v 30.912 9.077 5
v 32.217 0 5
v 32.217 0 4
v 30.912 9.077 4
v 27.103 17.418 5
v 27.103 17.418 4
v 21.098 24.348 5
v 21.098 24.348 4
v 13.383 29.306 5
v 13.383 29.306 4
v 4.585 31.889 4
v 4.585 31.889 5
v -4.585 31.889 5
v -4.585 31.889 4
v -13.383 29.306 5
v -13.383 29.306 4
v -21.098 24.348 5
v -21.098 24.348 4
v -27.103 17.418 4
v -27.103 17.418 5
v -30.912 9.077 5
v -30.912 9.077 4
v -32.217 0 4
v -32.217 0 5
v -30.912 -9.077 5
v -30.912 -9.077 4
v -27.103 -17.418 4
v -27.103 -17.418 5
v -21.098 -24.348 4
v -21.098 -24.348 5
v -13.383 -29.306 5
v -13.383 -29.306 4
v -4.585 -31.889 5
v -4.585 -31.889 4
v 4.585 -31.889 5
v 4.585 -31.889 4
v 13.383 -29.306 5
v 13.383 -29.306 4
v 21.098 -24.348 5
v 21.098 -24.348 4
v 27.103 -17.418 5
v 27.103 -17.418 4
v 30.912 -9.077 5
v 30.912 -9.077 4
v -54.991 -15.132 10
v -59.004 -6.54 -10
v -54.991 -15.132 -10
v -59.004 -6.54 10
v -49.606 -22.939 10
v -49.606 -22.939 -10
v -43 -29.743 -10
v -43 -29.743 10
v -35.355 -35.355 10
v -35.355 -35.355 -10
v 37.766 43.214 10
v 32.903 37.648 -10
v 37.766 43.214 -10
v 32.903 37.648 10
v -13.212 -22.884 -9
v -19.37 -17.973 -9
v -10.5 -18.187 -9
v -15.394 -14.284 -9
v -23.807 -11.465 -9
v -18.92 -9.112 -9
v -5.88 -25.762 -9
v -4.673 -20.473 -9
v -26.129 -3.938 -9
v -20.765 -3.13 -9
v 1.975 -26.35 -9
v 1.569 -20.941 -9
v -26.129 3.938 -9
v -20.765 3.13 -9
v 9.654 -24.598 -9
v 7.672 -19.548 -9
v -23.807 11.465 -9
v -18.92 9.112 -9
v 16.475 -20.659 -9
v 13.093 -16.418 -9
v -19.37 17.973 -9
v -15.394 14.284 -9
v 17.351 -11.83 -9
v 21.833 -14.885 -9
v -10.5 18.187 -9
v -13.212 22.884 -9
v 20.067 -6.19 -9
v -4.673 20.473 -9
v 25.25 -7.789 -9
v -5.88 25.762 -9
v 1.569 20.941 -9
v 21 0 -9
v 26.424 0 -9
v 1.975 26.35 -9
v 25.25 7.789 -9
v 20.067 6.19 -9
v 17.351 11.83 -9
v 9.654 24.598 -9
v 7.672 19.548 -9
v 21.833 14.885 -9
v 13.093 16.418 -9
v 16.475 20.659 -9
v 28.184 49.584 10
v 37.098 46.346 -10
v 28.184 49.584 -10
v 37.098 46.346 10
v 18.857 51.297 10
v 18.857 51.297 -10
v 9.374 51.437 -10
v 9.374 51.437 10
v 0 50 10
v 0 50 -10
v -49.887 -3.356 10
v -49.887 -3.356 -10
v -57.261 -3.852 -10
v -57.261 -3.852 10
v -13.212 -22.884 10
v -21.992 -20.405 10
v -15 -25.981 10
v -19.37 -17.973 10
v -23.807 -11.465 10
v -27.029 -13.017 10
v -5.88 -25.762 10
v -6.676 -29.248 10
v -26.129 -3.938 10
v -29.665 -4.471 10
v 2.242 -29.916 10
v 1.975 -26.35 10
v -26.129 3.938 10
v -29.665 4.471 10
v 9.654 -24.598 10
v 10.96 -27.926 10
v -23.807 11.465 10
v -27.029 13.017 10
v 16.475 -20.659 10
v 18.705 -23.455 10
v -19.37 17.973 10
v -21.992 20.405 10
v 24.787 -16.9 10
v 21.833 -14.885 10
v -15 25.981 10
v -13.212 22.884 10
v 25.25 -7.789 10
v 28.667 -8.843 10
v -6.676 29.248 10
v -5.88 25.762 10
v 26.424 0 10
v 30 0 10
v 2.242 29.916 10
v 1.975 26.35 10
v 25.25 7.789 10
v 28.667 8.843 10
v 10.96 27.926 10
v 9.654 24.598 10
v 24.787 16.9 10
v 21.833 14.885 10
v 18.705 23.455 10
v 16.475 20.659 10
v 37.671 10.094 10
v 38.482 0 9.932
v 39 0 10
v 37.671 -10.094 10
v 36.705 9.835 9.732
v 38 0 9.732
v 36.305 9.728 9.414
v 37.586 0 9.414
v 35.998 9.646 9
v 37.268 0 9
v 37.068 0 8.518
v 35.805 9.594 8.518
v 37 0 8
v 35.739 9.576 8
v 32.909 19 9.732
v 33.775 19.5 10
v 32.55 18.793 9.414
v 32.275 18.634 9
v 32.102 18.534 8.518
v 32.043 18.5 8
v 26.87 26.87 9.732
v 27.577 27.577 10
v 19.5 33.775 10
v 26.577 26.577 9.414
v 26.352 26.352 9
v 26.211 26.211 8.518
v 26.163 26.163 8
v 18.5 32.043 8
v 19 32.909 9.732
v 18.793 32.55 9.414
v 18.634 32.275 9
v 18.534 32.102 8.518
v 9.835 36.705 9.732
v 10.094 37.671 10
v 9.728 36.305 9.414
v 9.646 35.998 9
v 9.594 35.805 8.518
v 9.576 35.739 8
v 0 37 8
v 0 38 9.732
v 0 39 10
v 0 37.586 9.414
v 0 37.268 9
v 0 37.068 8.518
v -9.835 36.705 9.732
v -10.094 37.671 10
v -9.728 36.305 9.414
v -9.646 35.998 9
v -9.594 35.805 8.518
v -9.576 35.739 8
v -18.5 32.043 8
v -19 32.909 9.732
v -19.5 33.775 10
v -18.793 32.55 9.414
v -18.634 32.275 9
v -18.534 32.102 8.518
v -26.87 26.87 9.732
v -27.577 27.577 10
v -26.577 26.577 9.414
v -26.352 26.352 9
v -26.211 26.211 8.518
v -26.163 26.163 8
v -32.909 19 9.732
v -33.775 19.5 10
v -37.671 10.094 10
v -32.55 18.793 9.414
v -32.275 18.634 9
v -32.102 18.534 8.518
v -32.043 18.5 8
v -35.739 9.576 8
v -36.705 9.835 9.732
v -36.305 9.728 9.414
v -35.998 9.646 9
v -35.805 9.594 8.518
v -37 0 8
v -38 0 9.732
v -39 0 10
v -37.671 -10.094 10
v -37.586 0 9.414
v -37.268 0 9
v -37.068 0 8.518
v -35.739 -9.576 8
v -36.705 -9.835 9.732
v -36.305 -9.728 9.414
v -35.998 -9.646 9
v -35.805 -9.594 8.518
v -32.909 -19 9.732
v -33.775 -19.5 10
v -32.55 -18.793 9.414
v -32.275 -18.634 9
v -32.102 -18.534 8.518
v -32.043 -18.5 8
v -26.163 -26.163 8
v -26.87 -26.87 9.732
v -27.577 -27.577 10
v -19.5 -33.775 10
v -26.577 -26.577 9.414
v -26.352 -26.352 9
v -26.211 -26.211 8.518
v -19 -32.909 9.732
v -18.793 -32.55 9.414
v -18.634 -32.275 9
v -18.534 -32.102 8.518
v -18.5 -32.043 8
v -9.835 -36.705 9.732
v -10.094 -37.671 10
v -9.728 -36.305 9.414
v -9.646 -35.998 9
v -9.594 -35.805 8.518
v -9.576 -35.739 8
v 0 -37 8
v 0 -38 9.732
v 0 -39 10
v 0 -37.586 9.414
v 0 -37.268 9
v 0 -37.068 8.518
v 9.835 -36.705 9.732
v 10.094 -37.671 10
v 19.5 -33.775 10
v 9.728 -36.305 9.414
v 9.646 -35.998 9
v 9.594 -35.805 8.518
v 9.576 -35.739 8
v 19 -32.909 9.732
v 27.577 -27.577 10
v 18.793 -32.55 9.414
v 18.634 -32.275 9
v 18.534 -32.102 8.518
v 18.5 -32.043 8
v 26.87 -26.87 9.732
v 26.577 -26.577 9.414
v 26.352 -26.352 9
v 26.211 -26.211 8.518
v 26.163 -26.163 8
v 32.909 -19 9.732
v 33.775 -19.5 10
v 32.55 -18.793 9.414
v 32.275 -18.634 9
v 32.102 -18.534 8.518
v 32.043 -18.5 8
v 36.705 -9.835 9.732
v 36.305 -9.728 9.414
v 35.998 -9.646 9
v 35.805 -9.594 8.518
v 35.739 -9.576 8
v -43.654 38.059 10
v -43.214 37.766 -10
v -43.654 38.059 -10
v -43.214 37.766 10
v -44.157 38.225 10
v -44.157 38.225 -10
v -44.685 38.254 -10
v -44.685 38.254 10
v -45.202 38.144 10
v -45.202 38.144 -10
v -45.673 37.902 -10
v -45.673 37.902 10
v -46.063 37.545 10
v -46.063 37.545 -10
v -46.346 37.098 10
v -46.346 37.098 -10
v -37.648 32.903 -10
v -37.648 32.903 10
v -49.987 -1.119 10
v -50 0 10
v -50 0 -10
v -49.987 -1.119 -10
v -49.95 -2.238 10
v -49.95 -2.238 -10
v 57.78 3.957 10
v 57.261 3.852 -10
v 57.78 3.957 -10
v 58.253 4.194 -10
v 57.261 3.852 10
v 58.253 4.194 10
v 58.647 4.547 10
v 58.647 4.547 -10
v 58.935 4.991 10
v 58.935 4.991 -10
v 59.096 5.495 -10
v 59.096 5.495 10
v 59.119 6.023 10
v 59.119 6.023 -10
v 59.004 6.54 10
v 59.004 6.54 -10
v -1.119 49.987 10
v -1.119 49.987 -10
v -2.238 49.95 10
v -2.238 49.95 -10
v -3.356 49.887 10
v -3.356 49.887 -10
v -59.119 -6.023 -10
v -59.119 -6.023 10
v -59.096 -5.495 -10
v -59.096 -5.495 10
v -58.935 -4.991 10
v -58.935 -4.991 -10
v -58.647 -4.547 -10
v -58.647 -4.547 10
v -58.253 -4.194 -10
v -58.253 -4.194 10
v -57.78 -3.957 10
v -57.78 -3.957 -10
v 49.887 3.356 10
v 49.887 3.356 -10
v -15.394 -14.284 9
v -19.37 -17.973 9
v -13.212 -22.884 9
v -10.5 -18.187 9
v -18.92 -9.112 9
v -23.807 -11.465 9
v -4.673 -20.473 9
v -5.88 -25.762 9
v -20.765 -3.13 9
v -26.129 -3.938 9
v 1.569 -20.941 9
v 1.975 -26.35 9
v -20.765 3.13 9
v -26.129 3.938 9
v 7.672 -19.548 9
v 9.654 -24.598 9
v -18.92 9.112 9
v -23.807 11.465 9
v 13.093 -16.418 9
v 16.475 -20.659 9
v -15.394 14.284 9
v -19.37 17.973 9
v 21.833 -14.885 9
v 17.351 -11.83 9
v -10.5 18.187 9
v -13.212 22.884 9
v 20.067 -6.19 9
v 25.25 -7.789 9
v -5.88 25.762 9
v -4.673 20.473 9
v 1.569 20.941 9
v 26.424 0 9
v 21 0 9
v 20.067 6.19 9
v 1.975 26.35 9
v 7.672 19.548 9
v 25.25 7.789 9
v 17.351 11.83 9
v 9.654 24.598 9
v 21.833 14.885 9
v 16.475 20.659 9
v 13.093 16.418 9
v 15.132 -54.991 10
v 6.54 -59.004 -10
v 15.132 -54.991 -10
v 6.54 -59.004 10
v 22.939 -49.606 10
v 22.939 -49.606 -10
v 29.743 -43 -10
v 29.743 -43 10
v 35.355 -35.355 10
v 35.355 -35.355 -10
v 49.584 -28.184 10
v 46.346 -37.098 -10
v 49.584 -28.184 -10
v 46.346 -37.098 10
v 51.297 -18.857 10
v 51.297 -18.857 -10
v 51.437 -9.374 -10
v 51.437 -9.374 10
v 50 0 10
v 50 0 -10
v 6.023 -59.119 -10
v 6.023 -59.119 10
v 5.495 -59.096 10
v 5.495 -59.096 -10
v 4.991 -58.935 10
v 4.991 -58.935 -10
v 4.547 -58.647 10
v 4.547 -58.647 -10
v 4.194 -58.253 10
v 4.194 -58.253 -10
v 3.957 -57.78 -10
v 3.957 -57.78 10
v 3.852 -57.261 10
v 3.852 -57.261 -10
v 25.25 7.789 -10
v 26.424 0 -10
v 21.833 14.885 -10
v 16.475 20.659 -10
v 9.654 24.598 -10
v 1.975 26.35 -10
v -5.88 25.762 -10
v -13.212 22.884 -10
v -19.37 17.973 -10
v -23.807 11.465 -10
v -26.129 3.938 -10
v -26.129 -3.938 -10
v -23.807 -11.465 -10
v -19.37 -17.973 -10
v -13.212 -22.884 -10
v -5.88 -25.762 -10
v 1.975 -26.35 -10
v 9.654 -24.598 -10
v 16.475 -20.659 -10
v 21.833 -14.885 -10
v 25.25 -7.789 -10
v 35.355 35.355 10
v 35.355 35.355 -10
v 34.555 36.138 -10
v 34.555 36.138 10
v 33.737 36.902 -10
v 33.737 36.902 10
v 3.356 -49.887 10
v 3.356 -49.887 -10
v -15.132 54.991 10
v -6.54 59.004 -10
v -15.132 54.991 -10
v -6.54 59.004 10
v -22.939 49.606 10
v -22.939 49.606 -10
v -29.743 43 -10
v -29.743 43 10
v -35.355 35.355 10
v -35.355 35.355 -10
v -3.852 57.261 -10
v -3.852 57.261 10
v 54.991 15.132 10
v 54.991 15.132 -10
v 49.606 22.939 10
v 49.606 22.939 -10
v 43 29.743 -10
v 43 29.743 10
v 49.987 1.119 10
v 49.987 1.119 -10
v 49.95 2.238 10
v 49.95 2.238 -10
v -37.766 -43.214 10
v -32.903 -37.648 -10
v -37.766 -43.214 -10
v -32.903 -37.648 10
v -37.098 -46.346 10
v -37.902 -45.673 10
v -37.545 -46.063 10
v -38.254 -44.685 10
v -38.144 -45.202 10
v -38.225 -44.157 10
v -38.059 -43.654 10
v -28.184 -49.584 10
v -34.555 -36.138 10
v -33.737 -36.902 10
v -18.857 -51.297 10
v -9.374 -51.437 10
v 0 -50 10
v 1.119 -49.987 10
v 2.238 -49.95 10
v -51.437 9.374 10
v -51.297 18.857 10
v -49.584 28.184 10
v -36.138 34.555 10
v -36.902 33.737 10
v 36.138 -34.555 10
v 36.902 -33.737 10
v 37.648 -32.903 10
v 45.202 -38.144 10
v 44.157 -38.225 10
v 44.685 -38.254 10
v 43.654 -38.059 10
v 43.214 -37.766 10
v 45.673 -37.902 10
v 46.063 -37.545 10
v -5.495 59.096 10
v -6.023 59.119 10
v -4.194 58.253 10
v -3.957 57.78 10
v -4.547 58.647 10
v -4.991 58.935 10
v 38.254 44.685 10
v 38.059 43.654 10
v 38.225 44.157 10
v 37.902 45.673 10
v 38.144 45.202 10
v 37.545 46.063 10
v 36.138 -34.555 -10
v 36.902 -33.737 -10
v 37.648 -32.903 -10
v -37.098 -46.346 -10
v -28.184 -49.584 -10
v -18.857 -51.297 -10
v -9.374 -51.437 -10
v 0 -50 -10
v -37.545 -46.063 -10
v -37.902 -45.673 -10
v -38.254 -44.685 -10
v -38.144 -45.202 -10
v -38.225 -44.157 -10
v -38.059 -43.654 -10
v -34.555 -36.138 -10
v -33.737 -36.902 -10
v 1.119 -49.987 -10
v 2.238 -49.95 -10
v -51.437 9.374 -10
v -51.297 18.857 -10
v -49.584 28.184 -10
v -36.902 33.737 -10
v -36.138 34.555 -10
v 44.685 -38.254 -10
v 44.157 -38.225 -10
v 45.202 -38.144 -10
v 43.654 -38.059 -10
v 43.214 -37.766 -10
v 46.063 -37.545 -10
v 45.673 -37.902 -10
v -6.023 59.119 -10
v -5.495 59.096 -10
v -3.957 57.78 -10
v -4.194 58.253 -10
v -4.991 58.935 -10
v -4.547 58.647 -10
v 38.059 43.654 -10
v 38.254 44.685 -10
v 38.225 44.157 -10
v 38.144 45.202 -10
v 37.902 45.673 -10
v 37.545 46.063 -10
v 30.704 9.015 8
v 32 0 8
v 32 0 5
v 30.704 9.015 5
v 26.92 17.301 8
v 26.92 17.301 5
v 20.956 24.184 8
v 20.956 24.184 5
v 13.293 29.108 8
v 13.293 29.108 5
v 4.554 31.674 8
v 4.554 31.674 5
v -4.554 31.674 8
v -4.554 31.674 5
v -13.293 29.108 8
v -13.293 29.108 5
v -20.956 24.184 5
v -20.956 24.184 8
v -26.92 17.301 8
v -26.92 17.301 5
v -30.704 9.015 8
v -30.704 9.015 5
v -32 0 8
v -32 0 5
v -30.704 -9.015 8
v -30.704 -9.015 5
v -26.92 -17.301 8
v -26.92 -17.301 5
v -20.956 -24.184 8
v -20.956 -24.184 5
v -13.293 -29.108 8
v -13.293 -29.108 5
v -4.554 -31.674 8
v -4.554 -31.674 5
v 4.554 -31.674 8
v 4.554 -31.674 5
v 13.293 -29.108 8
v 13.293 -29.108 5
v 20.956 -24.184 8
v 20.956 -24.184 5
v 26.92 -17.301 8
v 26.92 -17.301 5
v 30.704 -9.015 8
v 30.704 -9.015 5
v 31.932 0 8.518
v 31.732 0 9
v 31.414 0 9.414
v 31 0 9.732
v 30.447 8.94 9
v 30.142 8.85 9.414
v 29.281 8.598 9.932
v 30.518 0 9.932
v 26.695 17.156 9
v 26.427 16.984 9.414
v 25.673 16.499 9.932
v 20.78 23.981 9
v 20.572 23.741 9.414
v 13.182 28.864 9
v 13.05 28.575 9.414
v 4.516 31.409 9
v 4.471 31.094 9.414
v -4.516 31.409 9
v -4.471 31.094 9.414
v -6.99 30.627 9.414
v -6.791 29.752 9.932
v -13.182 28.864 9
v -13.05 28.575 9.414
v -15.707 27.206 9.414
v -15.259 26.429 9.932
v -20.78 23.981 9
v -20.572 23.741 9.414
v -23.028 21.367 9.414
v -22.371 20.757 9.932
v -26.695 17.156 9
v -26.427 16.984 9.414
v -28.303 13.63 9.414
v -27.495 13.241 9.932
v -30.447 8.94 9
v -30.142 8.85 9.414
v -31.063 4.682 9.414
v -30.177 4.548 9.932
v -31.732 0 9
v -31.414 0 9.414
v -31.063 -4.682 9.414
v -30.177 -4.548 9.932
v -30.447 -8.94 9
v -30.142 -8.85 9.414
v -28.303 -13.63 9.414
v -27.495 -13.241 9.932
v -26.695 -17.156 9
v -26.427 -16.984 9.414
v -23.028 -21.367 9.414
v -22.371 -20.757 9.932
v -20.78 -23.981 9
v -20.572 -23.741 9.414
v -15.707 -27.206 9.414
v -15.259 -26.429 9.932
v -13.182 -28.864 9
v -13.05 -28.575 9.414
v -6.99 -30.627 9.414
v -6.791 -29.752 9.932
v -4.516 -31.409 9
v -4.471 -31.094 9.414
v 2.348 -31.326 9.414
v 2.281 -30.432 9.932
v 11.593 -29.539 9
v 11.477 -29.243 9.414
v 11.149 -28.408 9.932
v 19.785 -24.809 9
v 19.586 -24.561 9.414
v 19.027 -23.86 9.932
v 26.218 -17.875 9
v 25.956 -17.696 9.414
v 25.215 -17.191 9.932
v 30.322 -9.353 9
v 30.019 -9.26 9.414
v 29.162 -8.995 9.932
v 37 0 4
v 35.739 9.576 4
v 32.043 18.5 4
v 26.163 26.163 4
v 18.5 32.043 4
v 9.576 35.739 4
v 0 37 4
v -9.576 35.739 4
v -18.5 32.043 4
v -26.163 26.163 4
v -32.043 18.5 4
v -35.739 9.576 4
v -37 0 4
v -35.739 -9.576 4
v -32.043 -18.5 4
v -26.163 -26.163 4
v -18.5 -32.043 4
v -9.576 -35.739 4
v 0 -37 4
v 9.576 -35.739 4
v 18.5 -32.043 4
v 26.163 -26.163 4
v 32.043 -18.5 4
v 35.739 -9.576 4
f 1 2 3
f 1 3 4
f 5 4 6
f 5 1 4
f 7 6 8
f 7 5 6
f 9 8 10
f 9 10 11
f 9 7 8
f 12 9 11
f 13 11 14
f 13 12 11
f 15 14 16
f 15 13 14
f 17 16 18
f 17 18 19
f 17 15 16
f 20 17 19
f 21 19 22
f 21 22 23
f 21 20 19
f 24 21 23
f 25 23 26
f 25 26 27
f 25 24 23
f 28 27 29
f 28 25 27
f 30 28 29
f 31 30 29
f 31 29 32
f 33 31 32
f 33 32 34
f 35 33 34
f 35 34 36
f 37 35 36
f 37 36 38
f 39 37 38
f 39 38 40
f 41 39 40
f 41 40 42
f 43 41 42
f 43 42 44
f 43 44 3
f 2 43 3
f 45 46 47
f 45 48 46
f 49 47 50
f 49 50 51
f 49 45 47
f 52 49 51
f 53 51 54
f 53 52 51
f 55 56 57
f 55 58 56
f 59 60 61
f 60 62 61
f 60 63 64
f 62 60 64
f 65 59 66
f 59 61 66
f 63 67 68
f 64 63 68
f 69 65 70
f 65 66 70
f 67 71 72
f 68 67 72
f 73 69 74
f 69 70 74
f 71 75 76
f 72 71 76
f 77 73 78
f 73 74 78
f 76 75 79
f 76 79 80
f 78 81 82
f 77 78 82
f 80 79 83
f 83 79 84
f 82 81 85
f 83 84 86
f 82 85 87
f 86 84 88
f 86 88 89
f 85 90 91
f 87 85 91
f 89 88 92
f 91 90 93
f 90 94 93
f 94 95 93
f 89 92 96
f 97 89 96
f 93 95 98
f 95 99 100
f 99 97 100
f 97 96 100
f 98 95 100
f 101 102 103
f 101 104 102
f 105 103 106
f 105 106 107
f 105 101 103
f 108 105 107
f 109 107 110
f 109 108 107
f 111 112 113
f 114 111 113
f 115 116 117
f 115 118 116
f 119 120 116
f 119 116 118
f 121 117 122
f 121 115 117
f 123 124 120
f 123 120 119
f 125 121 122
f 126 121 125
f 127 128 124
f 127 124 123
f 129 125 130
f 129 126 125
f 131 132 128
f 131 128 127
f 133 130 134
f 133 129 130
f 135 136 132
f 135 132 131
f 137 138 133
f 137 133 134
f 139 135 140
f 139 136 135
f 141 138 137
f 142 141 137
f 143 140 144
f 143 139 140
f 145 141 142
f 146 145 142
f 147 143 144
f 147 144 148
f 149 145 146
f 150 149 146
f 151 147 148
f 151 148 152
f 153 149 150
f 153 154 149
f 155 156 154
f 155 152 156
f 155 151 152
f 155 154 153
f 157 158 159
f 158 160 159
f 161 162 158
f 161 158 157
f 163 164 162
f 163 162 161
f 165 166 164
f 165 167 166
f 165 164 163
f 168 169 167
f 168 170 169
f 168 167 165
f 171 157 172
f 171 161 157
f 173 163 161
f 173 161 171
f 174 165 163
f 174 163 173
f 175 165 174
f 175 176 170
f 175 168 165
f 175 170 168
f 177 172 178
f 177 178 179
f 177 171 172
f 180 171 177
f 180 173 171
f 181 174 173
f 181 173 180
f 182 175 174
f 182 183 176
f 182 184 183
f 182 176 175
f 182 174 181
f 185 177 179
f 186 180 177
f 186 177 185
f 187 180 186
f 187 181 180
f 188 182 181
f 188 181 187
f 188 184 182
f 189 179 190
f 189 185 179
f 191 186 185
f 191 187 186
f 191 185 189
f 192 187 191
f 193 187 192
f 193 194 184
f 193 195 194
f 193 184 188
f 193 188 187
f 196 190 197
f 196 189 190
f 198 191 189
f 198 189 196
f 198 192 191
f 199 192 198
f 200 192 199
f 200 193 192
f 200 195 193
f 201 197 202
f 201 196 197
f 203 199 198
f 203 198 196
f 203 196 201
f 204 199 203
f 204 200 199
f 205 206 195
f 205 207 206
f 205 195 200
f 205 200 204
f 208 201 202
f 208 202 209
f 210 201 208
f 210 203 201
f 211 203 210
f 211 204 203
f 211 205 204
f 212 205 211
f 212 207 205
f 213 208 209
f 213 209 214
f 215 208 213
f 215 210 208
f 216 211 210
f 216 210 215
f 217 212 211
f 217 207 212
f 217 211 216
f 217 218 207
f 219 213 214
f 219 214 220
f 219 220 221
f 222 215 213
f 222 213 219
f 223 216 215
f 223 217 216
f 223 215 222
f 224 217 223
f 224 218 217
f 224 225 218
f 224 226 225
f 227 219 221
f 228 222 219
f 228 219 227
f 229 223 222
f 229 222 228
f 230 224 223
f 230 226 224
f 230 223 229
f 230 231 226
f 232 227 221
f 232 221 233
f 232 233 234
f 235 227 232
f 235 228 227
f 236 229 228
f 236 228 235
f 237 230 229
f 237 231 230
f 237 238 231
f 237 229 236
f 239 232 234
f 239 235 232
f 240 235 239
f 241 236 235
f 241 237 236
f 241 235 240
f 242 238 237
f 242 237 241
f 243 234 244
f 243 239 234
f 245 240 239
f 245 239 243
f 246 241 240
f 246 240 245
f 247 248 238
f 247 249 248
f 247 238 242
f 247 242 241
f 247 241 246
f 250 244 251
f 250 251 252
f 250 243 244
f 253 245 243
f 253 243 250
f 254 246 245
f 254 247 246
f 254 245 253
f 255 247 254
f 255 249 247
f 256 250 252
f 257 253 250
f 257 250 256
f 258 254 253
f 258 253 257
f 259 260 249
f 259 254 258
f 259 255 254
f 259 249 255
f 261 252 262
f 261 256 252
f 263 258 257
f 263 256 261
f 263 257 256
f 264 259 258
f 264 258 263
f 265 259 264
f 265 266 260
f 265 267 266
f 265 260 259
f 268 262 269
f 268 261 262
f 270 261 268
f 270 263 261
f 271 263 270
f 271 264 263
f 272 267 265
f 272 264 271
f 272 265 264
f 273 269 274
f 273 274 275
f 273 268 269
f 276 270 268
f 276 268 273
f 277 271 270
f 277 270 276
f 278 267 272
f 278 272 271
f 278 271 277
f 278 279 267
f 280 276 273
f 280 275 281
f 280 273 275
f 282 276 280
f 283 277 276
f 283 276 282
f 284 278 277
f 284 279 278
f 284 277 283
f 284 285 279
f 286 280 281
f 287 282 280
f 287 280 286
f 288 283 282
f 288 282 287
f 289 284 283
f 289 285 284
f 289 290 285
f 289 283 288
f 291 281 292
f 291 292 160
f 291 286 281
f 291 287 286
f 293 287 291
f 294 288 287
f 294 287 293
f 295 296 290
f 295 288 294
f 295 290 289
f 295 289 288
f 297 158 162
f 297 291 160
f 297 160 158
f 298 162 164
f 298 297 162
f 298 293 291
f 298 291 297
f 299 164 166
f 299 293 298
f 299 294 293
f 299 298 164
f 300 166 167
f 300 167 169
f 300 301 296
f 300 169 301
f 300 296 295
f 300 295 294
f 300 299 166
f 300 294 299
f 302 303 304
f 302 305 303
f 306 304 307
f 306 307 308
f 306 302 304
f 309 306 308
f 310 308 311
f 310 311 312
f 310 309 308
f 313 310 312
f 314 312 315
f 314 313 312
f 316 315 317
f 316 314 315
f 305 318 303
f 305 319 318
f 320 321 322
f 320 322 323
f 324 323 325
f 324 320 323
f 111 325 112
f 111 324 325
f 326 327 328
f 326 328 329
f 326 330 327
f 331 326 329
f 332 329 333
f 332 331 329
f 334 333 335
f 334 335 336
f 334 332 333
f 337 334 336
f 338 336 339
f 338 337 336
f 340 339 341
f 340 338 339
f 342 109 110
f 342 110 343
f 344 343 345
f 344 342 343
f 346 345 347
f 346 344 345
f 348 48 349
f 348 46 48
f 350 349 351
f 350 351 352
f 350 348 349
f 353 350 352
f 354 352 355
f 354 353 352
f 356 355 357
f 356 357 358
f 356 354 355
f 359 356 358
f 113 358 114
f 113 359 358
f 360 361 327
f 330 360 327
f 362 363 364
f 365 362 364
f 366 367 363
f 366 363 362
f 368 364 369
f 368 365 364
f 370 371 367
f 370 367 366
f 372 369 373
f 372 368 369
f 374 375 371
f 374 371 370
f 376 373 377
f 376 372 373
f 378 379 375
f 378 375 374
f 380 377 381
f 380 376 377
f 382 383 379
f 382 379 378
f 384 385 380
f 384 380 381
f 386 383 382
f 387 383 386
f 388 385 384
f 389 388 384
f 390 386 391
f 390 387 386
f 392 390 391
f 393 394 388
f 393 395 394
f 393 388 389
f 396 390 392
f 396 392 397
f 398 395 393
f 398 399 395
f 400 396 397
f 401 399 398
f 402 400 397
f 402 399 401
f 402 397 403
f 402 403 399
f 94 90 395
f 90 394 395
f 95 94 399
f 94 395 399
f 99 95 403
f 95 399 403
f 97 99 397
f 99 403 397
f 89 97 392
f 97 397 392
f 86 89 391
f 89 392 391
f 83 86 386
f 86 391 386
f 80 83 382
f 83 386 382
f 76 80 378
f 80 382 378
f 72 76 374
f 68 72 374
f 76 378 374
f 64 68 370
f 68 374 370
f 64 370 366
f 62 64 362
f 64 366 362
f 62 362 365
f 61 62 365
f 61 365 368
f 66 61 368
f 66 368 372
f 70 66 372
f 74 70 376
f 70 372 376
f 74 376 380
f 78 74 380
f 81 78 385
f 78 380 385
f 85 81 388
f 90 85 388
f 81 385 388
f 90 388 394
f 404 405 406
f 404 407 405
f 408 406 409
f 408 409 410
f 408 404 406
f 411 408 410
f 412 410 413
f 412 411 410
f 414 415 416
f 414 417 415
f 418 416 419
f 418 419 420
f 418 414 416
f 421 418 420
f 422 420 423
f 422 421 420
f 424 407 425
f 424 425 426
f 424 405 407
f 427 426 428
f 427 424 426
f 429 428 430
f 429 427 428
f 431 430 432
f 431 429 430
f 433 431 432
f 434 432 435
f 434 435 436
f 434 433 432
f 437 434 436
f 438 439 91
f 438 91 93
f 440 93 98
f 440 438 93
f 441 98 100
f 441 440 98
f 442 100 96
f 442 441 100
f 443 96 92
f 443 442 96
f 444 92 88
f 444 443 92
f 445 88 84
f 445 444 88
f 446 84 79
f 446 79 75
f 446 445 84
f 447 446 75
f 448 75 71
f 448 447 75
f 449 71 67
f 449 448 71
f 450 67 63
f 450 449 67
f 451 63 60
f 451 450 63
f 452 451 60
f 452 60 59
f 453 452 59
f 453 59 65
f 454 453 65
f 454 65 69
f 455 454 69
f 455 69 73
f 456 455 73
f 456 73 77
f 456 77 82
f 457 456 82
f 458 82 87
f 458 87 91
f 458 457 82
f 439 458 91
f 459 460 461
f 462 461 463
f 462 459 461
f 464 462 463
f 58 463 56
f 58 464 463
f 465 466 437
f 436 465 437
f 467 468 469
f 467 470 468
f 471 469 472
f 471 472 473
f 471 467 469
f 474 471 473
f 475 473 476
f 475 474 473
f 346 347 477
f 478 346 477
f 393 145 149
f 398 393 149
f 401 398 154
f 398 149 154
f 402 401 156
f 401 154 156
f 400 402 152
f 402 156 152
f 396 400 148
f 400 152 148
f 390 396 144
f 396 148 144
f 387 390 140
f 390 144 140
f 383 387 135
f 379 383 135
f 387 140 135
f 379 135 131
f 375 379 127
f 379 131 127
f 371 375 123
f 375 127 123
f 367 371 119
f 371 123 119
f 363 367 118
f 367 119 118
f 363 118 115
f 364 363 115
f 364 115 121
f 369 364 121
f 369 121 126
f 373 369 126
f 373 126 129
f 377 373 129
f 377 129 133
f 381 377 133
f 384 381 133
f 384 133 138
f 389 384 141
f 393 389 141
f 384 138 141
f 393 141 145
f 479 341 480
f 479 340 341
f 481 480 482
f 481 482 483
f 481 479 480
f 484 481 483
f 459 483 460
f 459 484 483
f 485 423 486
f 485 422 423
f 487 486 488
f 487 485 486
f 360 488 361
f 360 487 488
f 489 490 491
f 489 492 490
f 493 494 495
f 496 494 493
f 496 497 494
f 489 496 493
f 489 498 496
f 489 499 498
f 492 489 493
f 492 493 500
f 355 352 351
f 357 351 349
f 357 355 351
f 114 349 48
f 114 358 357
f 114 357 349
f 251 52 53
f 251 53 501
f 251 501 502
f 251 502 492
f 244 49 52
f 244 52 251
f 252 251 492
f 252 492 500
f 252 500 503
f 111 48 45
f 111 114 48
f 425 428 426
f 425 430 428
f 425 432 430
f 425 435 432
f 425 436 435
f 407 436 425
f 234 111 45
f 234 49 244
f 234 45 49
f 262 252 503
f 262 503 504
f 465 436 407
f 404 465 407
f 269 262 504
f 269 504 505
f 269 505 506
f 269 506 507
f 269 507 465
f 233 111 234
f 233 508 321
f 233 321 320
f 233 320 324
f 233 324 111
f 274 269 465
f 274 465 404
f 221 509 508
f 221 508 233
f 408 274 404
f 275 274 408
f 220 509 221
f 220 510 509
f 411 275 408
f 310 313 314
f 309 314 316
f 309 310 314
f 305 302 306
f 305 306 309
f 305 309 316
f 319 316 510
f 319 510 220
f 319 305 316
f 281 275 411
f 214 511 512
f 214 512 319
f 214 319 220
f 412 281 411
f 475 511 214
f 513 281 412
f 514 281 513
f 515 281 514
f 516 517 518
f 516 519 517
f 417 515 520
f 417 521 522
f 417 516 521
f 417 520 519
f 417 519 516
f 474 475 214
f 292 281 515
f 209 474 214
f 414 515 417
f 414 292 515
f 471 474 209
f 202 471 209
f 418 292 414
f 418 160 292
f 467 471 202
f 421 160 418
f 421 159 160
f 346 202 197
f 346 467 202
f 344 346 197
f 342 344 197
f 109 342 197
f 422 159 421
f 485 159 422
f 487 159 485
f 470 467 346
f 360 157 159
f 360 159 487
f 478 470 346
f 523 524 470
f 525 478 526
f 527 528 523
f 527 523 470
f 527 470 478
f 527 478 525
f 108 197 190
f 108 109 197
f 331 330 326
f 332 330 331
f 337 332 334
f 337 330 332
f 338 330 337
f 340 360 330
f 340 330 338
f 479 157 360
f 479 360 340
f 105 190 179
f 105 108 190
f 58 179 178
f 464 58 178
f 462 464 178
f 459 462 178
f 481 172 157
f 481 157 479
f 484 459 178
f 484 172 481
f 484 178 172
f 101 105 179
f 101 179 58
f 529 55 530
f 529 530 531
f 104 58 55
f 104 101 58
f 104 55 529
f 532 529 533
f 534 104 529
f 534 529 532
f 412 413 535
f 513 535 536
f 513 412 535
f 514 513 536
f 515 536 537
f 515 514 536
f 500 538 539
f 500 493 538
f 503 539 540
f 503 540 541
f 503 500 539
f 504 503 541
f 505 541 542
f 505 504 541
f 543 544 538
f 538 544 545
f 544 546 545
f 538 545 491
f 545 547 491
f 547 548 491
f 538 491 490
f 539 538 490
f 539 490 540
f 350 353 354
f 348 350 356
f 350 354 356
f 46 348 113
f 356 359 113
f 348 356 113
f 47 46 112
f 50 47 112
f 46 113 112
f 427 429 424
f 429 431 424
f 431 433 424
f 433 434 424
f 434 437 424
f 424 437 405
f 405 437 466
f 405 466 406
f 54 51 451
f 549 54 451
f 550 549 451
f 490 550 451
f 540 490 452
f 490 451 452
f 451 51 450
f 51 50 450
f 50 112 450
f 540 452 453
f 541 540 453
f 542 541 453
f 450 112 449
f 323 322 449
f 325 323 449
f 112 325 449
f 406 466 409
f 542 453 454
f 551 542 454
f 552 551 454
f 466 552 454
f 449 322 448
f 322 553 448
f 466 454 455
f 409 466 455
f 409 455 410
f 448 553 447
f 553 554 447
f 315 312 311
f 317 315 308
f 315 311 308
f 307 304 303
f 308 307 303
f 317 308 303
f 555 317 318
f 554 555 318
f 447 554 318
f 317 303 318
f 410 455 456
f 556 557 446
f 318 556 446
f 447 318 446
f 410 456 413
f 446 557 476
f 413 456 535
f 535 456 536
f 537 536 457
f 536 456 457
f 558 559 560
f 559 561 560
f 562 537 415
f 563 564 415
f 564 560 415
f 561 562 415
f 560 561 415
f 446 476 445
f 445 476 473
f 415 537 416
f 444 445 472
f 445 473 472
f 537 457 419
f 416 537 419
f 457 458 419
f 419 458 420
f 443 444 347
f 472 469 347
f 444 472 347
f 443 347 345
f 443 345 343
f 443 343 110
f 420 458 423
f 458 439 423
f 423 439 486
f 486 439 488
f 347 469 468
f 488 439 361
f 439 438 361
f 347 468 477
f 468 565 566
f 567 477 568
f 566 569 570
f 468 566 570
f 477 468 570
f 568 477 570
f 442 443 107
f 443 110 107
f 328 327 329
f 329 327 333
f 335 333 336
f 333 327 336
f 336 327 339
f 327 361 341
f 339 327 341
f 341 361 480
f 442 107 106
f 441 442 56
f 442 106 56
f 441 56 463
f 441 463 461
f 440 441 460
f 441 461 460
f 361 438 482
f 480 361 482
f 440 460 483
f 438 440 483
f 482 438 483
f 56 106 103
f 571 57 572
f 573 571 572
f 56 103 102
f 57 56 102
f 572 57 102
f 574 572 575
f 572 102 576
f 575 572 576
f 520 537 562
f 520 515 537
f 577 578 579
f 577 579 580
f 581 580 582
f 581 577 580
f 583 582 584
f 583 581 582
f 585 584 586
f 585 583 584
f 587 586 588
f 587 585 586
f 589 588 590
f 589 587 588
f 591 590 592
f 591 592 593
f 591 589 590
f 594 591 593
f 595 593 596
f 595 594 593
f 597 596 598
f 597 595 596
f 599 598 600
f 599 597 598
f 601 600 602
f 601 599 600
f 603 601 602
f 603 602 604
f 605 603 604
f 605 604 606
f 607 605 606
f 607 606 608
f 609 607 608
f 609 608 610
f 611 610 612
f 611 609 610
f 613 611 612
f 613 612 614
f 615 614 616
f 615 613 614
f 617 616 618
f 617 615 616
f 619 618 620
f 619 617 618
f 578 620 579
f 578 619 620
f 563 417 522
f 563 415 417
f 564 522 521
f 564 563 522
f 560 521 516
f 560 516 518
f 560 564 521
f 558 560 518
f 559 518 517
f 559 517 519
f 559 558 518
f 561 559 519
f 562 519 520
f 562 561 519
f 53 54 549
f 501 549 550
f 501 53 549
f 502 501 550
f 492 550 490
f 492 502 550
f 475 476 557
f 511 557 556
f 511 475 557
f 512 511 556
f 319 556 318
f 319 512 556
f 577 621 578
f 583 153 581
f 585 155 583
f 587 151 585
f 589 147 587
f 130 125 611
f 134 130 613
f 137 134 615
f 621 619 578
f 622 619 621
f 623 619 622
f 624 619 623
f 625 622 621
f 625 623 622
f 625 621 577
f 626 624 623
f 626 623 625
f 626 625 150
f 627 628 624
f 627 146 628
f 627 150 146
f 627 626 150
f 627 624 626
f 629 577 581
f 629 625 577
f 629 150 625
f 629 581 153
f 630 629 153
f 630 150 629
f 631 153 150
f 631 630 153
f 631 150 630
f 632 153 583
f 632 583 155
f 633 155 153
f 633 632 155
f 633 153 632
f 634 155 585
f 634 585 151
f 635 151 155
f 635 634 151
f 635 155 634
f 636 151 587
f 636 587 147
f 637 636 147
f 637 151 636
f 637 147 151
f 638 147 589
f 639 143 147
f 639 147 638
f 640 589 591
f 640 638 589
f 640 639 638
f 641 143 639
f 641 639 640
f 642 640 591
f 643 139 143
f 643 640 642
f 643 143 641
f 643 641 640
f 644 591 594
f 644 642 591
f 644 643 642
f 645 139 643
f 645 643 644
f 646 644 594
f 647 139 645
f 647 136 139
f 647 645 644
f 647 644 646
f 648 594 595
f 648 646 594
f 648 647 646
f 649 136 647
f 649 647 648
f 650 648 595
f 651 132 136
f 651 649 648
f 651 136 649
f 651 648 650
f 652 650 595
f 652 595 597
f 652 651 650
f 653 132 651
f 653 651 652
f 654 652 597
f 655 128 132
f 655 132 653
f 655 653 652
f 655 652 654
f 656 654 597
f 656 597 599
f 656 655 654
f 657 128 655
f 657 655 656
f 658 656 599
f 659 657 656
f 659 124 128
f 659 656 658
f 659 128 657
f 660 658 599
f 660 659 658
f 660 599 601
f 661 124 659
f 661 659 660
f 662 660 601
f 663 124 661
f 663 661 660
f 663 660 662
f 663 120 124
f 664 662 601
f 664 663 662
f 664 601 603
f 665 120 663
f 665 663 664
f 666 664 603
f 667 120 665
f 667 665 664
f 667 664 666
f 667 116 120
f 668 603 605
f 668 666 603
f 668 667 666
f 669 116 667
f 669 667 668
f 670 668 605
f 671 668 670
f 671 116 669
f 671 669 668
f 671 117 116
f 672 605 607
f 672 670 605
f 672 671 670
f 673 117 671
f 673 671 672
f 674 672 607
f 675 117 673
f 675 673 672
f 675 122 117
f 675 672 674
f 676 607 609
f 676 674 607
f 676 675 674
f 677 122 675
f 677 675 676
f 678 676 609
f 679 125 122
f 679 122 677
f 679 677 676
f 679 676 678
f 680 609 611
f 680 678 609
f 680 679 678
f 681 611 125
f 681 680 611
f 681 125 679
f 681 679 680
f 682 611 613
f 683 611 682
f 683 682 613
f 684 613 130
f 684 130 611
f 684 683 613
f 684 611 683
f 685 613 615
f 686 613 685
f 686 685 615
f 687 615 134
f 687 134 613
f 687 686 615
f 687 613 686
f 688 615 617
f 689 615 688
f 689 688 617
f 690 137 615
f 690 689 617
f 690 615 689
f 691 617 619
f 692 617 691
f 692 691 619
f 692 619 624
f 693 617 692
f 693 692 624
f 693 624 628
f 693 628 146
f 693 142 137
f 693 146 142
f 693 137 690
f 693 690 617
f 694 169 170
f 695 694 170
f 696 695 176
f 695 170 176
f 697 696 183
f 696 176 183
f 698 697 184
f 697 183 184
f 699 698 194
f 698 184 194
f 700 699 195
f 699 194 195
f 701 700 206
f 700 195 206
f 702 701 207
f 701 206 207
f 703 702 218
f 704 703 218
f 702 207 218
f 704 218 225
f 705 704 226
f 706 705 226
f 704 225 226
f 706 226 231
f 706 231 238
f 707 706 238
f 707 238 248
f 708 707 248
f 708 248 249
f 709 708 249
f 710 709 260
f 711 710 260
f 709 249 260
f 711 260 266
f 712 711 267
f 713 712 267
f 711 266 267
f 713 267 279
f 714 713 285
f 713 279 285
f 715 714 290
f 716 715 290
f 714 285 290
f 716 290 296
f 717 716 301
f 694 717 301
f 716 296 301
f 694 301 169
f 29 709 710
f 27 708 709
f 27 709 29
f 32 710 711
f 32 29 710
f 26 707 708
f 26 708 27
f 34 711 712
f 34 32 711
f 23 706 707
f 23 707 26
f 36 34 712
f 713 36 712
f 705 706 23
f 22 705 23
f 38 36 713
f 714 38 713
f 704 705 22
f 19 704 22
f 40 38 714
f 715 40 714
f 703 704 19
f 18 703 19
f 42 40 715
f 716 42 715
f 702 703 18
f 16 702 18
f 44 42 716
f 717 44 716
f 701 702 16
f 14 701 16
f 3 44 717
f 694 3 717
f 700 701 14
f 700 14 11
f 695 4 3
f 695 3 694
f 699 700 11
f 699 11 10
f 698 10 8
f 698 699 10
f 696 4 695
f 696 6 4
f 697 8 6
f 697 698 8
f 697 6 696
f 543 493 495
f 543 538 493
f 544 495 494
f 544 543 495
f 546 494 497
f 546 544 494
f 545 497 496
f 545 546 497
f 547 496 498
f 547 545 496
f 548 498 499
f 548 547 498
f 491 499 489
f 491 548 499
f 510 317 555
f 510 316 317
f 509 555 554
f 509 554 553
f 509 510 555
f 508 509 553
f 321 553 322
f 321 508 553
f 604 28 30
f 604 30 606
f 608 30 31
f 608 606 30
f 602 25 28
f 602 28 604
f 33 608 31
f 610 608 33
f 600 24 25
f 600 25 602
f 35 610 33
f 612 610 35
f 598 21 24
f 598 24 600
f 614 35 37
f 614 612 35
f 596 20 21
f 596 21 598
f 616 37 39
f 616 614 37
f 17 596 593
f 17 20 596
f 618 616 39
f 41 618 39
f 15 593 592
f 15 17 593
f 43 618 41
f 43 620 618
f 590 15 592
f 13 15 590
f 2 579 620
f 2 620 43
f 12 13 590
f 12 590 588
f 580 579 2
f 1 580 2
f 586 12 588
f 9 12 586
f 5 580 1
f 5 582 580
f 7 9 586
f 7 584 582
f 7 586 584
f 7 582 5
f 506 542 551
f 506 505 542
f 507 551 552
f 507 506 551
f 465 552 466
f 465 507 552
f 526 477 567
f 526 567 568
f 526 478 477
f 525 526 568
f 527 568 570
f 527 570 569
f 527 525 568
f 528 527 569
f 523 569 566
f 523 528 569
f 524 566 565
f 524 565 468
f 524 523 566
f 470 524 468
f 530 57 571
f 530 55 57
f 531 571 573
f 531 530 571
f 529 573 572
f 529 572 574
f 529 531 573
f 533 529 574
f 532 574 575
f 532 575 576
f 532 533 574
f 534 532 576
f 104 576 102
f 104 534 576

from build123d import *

# Parameters (mm, degrees)
SKETCH1_R           = 21
BOSS_EXTRUDE1_DEPTH = 10
SKETCH11_R          = 26.424144251
CUT_EXTRUDE2_DEPTH  = 1
FILLET1_R           = 2
SKETCH12_R          = 37
SKETCH12_R_2        = 32.216977435
CUT_EXTRUDE3_DEPTH  = 5
SKETCH13_R          = 37
SKETCH13_R_2        = 32
CUT_EXTRUDE5_DEPTH  = 5
FILLET2_R           = 2


with BuildPart() as part:
    # Sketch1 → Boss-Extrude1 (new body)
    with BuildSketch(Plane.XY):
        with BuildLine():
            Line((49.887269323, 3.355645919), (59.864723187, 4.026775102))
            ThreePointArc((59.864723187, 4.026775102), (50.436634414, 21.90240344), (35.355339059, 35.355339059))
            ThreePointArc((35.355339059, 35.355339059), (34.148336007, 36.52247456), (32.902826449, 37.648426417))
            Line((32.902826449, 37.648426417), (39.483391738, 45.178111701))
            ThreePointArc((39.483391738, 45.178111701), (20.176748218, 51.151424211), (0, 50))
            ThreePointArc((0, 50), (-1.67876947, 49.971809384), (-3.355645919, 49.887269323))
            Line((-3.355645919, 49.887269323), (-4.026775102, 59.864723187))
            ThreePointArc((-4.026775102, 59.864723187), (-21.90240344, 50.436634414), (-35.355339059, 35.355339059))
            ThreePointArc((-35.355339059, 35.355339059), (-36.52247456, 34.148336007), (-37.648426417, 32.902826449))
            Line((-37.648426417, 32.902826449), (-45.178111701, 39.483391738))
            ThreePointArc((-45.178111701, 39.483391738), (-51.151424211, 20.176748218), (-50, 0))
            ThreePointArc((-50, 0), (-49.971809384, -1.67876947), (-49.887269323, -3.355645919))
            Line((-49.887269323, -3.355645919), (-59.864723187, -4.026775102))
            ThreePointArc((-59.864723187, -4.026775102), (-50.436634414, -21.90240344), (-35.355339059, -35.355339059))
            ThreePointArc((-35.355339059, -35.355339059), (-34.148336007, -36.52247456), (-32.902826449, -37.648426417))
            Line((-32.902826449, -37.648426417), (-39.483391738, -45.178111701))
            ThreePointArc((-39.483391738, -45.178111701), (-20.176748218, -51.151424211), (0, -50))
            ThreePointArc((0, -50), (1.67876947, -49.971809384), (3.355645919, -49.887269323))
            Line((3.355645919, -49.887269323), (4.026775102, -59.864723187))
            ThreePointArc((4.026775102, -59.864723187), (21.90240344, -50.436634414), (35.355339059, -35.355339059))
            ThreePointArc((35.355339059, -35.355339059), (36.52247456, -34.148336007), (37.648426417, -32.902826449))
            Line((37.648426417, -32.902826449), (45.178111701, -39.483391738))
            ThreePointArc((45.178111701, -39.483391738), (51.151424211, -20.176748218), (50, 0))
            ThreePointArc((50, 0), (49.971809384, 1.67876947), (49.887269323, 3.355645919))
        make_face()
        Circle(SKETCH1_R, mode=Mode.SUBTRACT)
    boss_extrude1 = extrude(amount=BOSS_EXTRUDE1_DEPTH)

    # Sketch11 → Cut-Extrude2 (cut)
    with BuildSketch(Plane.XY.offset(10)):
        Circle(SKETCH11_R)
    cut_extrude2 = extrude(amount=-CUT_EXTRUDE2_DEPTH, mode=Mode.SUBTRACT)

    # Mirror1: Boss-Extrude1, Cut-Extrude2 across Front Plane
    add(boss_extrude1.mirror(Plane.XY))
    add(cut_extrude2.mirror(Plane.XY), mode=Mode.SUBTRACT)

    # Fillet1
    fillet1_edges = [part.edges().sort_by_distance(p)[0] for p in [
        (59.864723187, 4.026775102, 0),
        (45.178111701, -39.483391738, 0),
        (4.026775102, -59.864723187, 0),
        (-39.483391738, -45.178111701, 0),
        (-59.864723187, -4.026775102, 0),
        (-45.178111701, 39.483391738, 0),
        (-4.026775102, 59.864723187, 0),
        (39.483391738, 45.178111701, 0),
    ]]
    fillet(fillet1_edges, radius=FILLET1_R)

    # Sketch12 → Cut-Extrude3 (cut)
    with BuildSketch(Plane.XY.offset(9)):
        Circle(SKETCH12_R)
        Circle(SKETCH12_R_2, mode=Mode.SUBTRACT)
    extrude(amount=-CUT_EXTRUDE3_DEPTH, mode=Mode.SUBTRACT)

    # Sketch13 → Cut-Extrude5 (cut)
    with BuildSketch(Plane.XY.offset(10)):
        Circle(SKETCH13_R)
        Circle(SKETCH13_R_2, mode=Mode.SUBTRACT)
    extrude(amount=-CUT_EXTRUDE5_DEPTH, mode=Mode.SUBTRACT)

    # Fillet2
    fillet2_edges = [part.edges().sort_by_distance(p)[0] for p in [
        (-37, 0, 10),
        (-32, 0, 10),
    ]]
    fillet(fillet2_edges, radius=FILLET2_R)


solid = part.part
